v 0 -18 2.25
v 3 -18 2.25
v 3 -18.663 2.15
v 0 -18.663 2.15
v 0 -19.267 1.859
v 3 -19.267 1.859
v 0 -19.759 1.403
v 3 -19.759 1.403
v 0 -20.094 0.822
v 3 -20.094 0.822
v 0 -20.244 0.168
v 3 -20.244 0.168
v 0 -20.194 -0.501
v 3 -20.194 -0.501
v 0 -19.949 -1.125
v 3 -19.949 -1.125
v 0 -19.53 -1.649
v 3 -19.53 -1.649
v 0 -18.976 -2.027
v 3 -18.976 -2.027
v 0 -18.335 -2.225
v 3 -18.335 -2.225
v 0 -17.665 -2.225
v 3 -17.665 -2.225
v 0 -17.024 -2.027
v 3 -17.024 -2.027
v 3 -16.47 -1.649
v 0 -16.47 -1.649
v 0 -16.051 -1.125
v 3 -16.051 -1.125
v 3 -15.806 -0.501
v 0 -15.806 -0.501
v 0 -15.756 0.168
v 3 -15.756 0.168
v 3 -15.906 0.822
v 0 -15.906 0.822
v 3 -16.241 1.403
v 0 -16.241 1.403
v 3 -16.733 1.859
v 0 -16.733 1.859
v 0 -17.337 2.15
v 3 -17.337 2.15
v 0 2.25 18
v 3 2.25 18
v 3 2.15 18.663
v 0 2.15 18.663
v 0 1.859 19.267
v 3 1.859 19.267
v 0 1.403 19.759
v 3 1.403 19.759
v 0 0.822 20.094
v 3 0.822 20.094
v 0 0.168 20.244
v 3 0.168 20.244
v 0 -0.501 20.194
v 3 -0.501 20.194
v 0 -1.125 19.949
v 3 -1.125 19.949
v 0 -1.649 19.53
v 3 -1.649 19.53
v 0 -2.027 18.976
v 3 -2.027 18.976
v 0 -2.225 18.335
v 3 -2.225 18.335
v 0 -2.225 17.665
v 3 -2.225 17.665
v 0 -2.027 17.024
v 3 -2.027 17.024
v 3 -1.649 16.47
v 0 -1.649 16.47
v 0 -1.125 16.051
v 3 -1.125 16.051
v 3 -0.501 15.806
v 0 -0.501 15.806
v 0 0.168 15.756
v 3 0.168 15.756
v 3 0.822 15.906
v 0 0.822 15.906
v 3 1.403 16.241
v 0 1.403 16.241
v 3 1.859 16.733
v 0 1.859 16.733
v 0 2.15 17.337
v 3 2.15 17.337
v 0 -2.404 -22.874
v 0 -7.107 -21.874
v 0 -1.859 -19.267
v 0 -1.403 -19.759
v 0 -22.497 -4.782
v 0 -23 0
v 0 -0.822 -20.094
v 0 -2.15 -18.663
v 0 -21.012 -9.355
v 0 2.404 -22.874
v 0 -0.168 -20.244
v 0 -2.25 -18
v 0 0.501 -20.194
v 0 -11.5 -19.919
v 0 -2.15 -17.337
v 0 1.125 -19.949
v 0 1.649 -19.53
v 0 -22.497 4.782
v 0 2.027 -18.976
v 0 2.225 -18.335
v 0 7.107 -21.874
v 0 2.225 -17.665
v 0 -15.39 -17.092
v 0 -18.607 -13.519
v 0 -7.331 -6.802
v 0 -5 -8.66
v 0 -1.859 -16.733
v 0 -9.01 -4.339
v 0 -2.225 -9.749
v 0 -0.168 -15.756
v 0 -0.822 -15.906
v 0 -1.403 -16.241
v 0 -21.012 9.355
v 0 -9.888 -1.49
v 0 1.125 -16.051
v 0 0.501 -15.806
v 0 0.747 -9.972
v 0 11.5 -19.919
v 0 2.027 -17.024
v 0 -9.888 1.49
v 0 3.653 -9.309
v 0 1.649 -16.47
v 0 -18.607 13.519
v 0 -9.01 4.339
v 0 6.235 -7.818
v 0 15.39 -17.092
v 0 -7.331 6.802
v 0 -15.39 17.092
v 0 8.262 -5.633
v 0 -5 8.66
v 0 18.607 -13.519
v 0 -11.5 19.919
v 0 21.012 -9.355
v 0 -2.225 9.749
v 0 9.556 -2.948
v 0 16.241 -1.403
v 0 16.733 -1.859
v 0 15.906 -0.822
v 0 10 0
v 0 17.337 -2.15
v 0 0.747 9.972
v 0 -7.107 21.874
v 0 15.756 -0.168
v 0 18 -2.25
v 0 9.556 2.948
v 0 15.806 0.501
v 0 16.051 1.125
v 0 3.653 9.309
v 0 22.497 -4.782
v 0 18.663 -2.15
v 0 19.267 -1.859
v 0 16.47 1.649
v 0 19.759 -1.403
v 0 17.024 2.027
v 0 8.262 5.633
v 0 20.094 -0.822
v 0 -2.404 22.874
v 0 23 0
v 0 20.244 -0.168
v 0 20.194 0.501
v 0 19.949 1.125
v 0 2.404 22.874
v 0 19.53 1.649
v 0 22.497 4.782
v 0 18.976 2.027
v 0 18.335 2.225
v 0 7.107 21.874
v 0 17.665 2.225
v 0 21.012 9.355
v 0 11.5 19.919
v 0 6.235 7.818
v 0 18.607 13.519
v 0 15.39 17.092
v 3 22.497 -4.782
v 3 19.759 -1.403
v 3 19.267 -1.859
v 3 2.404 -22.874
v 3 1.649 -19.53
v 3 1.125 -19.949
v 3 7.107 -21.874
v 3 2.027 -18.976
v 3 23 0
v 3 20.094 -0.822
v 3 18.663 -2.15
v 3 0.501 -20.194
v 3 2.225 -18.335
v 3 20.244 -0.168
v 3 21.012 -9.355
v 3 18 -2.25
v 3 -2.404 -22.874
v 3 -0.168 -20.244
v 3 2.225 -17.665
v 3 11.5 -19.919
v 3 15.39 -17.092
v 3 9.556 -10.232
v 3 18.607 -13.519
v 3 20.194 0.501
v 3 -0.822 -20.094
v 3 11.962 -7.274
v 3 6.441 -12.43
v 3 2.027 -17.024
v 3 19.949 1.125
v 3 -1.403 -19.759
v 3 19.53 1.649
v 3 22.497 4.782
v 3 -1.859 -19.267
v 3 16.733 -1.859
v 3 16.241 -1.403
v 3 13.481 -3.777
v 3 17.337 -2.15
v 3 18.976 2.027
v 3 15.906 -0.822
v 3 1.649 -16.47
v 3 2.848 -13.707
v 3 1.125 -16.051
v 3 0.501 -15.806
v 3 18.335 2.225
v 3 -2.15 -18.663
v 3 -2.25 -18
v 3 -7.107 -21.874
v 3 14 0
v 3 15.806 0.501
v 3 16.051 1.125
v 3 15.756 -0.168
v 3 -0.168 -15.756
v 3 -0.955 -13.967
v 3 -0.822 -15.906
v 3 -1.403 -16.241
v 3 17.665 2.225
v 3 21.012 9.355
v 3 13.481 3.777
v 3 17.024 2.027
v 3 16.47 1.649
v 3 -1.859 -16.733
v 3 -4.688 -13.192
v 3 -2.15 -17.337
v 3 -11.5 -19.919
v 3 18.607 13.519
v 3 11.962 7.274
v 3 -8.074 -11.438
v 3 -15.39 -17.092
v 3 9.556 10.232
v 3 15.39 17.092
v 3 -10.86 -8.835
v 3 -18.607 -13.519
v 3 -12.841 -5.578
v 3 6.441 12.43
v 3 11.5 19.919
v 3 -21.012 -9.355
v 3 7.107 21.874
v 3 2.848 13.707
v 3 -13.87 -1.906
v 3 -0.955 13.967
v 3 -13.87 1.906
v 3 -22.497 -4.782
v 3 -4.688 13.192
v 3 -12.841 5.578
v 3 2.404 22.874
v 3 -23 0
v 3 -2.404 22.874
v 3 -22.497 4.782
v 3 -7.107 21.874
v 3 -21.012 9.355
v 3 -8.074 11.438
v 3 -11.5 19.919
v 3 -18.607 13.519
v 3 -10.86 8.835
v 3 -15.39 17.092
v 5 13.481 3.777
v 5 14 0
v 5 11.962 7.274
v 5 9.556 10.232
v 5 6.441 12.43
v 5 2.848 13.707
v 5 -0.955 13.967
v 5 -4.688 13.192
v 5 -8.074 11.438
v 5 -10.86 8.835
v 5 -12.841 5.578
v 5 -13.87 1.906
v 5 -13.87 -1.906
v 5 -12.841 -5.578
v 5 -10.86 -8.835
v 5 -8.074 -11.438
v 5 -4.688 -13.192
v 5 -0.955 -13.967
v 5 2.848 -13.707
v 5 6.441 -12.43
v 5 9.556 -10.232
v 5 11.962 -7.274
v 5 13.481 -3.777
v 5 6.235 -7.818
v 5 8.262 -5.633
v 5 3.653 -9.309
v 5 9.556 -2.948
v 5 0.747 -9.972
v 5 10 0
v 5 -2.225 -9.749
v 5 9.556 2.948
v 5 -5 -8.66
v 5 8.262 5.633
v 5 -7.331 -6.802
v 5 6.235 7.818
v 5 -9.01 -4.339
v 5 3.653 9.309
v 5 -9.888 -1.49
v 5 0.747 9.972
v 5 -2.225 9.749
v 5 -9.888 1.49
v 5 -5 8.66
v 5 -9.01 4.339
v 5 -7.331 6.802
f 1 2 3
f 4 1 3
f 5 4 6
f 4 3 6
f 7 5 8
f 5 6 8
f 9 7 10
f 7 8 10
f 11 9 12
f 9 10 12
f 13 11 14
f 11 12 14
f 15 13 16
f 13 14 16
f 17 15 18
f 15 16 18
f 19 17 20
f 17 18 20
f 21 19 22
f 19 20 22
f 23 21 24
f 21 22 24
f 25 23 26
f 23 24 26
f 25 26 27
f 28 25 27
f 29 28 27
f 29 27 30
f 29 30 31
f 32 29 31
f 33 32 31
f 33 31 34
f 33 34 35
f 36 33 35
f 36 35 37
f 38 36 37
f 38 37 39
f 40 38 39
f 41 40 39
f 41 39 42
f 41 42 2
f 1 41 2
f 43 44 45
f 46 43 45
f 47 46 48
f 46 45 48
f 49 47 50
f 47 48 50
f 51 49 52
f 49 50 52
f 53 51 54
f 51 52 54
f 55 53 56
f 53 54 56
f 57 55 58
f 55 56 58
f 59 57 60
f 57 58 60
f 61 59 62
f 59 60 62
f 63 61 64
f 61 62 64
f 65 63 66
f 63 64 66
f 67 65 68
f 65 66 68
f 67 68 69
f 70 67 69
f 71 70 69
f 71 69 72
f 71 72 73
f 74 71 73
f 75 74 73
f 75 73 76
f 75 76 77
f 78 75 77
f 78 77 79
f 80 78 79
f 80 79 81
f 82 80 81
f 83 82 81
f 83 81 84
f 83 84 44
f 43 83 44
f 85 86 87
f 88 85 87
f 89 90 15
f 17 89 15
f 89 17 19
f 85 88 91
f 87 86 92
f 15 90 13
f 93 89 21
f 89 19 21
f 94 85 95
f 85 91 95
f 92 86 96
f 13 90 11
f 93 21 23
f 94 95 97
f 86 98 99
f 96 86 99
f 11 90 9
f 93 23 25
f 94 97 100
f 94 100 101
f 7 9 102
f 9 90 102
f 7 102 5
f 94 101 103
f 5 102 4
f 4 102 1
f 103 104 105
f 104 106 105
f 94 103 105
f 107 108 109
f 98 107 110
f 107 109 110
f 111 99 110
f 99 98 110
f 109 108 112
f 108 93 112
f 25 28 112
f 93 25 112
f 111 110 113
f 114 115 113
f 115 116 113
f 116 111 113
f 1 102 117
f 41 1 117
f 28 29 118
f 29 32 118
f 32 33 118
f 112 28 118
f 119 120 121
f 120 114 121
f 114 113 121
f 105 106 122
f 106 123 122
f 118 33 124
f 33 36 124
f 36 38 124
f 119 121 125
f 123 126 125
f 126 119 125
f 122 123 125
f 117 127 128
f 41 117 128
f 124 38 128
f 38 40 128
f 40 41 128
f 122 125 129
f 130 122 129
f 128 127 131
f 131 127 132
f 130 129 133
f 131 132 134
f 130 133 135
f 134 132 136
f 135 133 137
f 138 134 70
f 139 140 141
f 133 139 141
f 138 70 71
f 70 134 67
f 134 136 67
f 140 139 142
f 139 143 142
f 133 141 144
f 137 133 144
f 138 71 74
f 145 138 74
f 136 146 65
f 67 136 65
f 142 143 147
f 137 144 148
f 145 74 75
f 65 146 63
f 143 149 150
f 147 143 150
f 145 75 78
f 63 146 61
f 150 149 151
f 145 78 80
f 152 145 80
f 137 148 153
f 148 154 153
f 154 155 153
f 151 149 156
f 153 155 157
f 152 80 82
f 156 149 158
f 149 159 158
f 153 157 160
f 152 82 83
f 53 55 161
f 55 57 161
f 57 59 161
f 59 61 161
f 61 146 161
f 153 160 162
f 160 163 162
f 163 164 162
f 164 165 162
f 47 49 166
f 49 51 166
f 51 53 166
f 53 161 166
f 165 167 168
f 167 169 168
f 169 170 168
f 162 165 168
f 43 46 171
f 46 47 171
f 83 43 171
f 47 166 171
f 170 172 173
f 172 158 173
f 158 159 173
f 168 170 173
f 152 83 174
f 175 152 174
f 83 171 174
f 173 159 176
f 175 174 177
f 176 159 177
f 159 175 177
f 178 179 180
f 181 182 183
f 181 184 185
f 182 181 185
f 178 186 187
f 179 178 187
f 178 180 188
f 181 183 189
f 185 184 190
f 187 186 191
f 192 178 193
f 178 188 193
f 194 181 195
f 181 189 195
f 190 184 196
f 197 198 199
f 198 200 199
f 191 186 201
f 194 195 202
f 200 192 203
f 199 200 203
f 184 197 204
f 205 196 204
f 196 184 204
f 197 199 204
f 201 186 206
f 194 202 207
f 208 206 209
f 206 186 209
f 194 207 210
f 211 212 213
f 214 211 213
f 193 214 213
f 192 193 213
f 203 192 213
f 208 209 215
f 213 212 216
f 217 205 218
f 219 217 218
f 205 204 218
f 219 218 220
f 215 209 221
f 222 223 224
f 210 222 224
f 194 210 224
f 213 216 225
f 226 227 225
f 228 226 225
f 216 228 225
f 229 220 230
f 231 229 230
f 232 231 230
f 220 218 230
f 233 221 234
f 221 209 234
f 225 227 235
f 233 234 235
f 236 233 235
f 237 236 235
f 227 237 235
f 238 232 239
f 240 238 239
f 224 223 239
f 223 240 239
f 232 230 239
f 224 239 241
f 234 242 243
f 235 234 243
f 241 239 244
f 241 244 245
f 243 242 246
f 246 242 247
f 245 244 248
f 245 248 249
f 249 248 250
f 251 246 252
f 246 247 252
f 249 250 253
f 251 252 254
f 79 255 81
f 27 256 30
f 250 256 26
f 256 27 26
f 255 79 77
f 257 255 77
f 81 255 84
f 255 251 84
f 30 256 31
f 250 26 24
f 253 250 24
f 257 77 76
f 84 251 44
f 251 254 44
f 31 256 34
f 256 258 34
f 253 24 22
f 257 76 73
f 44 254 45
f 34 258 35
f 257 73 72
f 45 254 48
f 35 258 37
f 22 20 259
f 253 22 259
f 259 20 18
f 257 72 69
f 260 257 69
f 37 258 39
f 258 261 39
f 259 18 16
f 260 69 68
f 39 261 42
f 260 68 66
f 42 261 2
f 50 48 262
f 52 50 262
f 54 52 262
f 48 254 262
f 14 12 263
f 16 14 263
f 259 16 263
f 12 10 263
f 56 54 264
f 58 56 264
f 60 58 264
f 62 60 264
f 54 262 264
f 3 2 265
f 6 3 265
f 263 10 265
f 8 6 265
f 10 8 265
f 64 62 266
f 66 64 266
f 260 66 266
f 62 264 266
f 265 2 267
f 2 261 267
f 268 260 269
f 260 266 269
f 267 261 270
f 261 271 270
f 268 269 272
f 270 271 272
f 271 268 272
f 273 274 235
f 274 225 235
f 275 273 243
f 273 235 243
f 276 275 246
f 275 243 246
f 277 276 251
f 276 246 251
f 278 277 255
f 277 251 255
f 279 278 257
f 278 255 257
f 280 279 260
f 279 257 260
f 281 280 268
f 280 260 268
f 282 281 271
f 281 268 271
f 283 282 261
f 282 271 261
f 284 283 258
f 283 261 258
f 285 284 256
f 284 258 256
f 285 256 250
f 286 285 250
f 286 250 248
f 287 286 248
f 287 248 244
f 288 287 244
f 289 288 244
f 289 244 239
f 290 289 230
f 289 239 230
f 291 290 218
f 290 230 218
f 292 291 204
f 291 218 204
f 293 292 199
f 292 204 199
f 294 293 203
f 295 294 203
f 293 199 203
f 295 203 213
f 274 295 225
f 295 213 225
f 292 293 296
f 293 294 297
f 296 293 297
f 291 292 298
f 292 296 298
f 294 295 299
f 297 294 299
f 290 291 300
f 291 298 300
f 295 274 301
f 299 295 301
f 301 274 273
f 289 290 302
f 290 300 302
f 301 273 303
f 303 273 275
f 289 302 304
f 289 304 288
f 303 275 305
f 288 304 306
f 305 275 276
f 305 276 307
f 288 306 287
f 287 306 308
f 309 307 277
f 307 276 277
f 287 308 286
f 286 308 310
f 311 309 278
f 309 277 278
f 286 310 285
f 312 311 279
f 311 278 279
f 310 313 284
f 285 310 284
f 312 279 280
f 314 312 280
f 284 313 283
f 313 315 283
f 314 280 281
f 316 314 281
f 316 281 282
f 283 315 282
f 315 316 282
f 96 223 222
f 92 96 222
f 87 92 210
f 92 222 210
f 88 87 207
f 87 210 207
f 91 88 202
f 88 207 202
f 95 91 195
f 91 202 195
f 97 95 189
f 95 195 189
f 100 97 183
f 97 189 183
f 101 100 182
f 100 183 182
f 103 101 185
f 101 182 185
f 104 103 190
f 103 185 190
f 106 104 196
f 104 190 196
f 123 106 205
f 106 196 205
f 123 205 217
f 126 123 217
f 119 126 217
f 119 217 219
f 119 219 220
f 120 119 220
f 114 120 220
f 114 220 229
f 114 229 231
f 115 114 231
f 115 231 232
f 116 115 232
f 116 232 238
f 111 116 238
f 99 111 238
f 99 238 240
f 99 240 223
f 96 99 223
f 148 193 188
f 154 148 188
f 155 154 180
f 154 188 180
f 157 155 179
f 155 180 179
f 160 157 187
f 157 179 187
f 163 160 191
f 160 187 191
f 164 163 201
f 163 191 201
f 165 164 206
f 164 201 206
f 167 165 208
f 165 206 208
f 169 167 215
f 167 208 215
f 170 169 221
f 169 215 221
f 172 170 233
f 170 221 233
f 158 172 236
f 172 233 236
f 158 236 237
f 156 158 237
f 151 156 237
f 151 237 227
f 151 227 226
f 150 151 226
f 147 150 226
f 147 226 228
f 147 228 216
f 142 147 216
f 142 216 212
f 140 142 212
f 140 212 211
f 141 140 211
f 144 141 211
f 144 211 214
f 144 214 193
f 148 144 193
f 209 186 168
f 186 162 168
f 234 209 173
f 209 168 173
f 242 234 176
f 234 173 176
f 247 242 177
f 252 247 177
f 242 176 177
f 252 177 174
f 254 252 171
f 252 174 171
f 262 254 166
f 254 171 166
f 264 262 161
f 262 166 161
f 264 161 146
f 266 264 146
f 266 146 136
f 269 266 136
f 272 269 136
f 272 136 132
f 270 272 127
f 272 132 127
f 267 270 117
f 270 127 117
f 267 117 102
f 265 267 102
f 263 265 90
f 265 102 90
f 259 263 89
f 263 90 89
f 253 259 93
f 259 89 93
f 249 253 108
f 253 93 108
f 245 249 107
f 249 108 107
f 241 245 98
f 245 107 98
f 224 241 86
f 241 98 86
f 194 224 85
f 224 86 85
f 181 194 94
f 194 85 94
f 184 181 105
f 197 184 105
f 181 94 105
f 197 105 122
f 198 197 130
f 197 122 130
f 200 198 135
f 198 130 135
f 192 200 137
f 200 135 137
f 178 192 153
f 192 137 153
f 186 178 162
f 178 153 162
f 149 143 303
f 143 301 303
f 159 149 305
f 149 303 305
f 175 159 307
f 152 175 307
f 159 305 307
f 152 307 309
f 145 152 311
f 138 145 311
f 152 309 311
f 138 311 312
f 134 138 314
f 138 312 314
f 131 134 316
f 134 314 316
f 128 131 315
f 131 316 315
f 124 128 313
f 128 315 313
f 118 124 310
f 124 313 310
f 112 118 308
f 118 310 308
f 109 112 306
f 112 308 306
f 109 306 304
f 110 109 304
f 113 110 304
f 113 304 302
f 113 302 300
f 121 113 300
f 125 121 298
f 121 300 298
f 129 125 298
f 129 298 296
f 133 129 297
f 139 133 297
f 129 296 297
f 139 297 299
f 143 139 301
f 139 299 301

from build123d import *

# Parameters (mm, degrees)
M4_CLEARANCE_HOLE1_D     = 4.5
M4_CLEARANCE_HOLE1_DEPTH = 3
CIRPATTERN1_COUNT        = 4


with BuildPart() as part:
    # Sketch1 → Revolve1 (revolve)
    with BuildSketch(Plane.XY):
        Polygon((0, 10), (5, 10), (5, 14), (3, 14), (3, 23), (0, 23), align=None)
    revolve(axis=Axis((0, 0, 0), (1, 0, 0)))

    # M4 Clearance Hole1
    with Locations(Plane.ZY):
        with Locations((0, 18)):
            m4_clearance_hole1 = Hole(M4_CLEARANCE_HOLE1_D / 2, depth=M4_CLEARANCE_HOLE1_DEPTH)

    # CirPattern1: M4 Clearance Hole1 ×4 about axis
    cirpattern1_axis = Axis((0, 0, 0), (1, 0, 0))
    for i in range(1, CIRPATTERN1_COUNT):
        add(m4_clearance_hole1.rotate(cirpattern1_axis, i * 360 / CIRPATTERN1_COUNT), mode=Mode.SUBTRACT)


solid = part.part
